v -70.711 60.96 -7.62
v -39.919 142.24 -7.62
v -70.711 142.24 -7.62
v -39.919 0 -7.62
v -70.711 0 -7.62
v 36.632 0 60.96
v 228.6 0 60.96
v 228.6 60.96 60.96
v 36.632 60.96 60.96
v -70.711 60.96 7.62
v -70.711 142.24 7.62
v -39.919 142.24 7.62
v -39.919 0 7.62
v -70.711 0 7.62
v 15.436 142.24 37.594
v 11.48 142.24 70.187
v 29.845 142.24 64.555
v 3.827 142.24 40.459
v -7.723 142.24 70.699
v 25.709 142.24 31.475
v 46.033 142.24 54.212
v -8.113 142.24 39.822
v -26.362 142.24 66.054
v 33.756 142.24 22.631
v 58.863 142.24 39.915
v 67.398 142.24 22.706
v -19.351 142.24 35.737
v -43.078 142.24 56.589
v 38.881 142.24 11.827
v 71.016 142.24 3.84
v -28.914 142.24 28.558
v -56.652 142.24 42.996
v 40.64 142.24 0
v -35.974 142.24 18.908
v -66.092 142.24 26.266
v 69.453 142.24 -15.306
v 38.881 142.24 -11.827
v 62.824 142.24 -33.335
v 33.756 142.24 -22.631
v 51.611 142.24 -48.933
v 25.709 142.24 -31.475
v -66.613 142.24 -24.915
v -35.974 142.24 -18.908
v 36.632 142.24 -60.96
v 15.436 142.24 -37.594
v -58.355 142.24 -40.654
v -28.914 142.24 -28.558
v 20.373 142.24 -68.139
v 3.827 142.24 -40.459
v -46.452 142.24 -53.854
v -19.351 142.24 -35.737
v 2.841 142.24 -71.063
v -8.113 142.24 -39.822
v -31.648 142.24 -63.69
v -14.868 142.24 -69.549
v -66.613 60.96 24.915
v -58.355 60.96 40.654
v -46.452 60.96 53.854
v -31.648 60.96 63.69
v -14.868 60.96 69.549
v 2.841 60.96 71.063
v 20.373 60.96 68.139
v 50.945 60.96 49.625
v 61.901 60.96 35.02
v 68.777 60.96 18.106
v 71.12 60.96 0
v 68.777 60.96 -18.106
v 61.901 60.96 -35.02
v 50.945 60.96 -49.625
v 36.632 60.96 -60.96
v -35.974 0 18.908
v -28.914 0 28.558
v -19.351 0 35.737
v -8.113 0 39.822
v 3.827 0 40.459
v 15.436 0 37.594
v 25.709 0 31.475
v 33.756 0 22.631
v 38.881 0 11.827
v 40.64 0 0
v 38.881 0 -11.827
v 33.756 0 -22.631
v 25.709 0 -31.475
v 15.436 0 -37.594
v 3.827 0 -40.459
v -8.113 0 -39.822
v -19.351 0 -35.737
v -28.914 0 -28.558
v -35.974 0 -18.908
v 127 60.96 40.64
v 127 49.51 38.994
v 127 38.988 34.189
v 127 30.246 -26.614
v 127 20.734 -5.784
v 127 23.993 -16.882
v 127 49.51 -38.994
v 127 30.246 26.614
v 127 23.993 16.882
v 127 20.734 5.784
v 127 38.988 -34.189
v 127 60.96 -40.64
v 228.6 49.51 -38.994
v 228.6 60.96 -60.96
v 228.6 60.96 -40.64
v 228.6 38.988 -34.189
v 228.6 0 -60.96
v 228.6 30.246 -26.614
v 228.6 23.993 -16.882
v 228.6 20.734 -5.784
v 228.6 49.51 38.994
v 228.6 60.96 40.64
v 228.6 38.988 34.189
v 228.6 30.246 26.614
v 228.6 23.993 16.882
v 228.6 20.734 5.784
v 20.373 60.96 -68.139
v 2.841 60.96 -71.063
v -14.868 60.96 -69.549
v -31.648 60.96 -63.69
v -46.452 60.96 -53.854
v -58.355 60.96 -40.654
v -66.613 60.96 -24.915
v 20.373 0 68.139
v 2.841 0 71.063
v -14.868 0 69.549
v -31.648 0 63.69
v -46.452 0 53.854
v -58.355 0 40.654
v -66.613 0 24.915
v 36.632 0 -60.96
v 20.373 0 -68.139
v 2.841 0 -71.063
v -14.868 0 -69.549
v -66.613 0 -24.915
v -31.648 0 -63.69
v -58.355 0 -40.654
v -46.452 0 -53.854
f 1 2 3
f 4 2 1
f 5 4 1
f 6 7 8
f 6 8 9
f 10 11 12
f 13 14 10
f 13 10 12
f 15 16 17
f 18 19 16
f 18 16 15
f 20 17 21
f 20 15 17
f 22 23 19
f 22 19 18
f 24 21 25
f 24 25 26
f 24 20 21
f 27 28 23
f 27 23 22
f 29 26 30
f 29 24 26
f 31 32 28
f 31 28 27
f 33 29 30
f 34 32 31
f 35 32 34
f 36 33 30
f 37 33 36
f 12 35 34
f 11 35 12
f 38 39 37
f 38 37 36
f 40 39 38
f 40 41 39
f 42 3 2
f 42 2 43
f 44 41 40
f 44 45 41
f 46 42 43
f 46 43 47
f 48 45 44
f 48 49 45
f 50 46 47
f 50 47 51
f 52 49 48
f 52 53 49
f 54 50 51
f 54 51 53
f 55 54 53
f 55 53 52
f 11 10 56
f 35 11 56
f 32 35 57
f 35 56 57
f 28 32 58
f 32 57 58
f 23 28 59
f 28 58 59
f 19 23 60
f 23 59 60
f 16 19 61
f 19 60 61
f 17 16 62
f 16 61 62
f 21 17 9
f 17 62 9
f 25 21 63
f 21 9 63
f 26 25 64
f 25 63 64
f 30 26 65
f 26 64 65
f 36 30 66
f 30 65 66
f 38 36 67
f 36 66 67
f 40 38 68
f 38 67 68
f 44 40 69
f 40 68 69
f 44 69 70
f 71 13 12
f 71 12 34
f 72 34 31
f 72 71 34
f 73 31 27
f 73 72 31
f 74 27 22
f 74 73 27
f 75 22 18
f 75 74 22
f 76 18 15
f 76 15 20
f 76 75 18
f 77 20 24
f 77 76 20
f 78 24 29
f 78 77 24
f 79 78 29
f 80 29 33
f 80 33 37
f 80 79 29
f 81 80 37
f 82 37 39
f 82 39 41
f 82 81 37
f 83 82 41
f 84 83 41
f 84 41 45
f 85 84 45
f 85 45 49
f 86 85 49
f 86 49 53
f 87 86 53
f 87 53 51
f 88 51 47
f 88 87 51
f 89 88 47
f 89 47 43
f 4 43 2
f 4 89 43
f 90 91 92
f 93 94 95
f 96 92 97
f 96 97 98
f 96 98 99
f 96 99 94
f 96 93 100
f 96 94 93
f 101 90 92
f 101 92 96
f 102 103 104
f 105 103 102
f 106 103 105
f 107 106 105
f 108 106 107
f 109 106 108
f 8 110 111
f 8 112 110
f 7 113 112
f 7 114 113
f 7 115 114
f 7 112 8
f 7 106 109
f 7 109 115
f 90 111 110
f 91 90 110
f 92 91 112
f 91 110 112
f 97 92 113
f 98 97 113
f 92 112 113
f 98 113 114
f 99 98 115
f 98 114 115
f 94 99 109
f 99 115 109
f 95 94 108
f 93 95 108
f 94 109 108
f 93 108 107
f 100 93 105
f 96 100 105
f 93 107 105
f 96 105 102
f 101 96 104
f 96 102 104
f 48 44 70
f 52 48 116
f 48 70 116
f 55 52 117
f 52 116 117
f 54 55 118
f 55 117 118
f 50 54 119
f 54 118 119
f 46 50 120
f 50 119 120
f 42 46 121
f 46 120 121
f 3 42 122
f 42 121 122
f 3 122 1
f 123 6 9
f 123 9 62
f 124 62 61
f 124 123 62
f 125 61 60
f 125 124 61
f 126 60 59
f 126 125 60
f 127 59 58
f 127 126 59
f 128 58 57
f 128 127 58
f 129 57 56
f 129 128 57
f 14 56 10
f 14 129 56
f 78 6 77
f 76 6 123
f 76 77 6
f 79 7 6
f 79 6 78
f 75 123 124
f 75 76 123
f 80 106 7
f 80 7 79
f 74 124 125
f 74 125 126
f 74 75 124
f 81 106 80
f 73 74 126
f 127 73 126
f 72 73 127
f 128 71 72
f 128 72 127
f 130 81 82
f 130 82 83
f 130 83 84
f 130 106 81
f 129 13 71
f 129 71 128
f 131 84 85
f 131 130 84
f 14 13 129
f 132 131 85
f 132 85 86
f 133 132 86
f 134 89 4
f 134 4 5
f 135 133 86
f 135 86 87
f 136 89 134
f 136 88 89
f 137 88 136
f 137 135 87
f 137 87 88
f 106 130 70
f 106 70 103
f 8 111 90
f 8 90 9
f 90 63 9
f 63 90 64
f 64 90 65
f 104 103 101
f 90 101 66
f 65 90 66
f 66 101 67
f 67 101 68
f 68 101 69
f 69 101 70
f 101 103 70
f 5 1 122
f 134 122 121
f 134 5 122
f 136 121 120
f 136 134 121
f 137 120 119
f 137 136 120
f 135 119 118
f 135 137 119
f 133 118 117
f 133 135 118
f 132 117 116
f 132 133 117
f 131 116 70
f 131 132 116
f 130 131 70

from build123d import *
from build123d.topology import SkipClean

# Parameters (mm, degrees)
BOSS_EXTRUDE2_DEPTH = 60.96
SKETCH2_R           = 71.12
BOSS_EXTRUDE3_DEPTH = 81.28
CUT_EXTRUDE1_DEPTH  = 101.6
CUT_EXTRUDE2_START  = -142.24
CUT_EXTRUDE2_DEPTH  = 142.24


with BuildPart() as part:
    # Sketch1 → Boss-Extrude2 (new body)
    with BuildSketch(Plane(origin=(0, 0, 0), x_dir=(1, 0, 0), z_dir=(0, 1, 0))):
        with BuildLine():
            Line((228.6, 60.96), (228.6, -60.96))
            Line((228.6, -60.96), (36.632400959, -60.96))
            ThreePointArc((36.632400959, -60.96), (-71.12, 0), (36.632400959, 60.96))
            Line((36.632400959, 60.96), (228.6, 60.96))
        make_face()
    extrude(amount=BOSS_EXTRUDE2_DEPTH)

    # Sketch2 → Boss-Extrude3 (add)
    with SkipClean():  # the faces are left unmerged after this step: merging them gives an invalid solid
        with BuildSketch(Plane(origin=(0, 60.96, 0), x_dir=(1, 0, 0), z_dir=(0, 1, 0))):
            with Locations(Location((0, 0, 0), (0, 0, 58.997280866))):
                Circle(SKETCH2_R)
        extrude(amount=BOSS_EXTRUDE3_DEPTH)

    # Sketch3 → Cut-Extrude1 (cut)
    with SkipClean():  # the faces are left unmerged after this step: merging them gives an invalid solid
        with BuildSketch(Plane(origin=(228.6, 0, 0), x_dir=(0, 0, -1), z_dir=(1, 0, 0))):
            with BuildLine():
                Line((40.64, 60.96), (-40.64, 60.96))
                ThreePointArc((-40.64, 60.96), (0, 20.32), (40.64, 60.96))
            make_face()
        extrude(amount=-CUT_EXTRUDE1_DEPTH, mode=Mode.SUBTRACT)

    # Sketch4 → Cut-Extrude2 (cut)
    with SkipClean():  # the faces are left unmerged after this step: merging them gives an invalid solid
        with BuildSketch(Plane(origin=(0, 142.24, 0), x_dir=(1, 0, 0), z_dir=(0, 1, 0)).offset(CUT_EXTRUDE2_START)):
            with BuildLine():
                Line((-39.91923346, 7.62), (-70.710607408, 7.62))
                ThreePointArc((-70.710607408, 7.62), (-71.12, 0), (-70.710607408, -7.62))
                Line((-70.710607408, -7.62), (-39.91923346, -7.62))
                ThreePointArc((-39.91923346, -7.62), (40.64, 0), (-39.91923346, 7.62))
            make_face()
        extrude(amount=CUT_EXTRUDE2_DEPTH, mode=Mode.SUBTRACT)


solid = part.part
